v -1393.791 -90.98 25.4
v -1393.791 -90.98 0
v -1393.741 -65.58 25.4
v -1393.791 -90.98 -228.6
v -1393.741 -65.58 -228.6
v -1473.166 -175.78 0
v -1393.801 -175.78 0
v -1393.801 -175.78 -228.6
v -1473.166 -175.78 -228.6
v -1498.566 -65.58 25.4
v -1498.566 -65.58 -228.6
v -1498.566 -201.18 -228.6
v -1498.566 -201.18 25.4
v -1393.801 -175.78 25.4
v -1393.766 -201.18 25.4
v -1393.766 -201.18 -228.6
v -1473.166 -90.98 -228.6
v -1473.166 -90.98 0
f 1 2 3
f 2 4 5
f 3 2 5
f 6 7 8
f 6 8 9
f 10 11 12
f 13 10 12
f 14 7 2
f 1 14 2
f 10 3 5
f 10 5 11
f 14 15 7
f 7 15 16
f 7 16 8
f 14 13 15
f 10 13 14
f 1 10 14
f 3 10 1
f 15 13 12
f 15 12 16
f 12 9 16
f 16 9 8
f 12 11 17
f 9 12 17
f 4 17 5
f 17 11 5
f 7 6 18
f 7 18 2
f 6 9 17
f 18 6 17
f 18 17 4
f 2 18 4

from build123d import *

# Parameters (mm, degrees)
BOSS_EXTRUDE1_DEPTH      = 25.4
BOSS_EXTRUDE1_DEPTH_BACK = 228.6
BOSS_EXTRUDE2_DEPTH      = 25.4


with BuildPart() as part:
    # Sketch2 → Boss-Extrude1 (new, two sides: drawn at the far end of the back side and taken through both)
    with BuildSketch(Plane.XY.offset(-BOSS_EXTRUDE1_DEPTH_BACK)):
        Polygon((-1498.565662295, -201.179604763), (-1393.765822295, -201.179604763), (-1393.800822295, -175.779604763), (-1473.165662295, -175.779604763), (-1473.165662295, -90.979604763), (-1393.790662295, -90.979604763), (-1393.740982295, -65.579604763), (-1498.565662295, -65.579604763), align=None)
    extrude(amount=BOSS_EXTRUDE1_DEPTH + BOSS_EXTRUDE1_DEPTH_BACK)

    # Sketch2<3> → Boss-Extrude2 (add)
    with BuildSketch(Plane.XY):
        Polygon((-1473.165662295, -175.779604763), (-1393.800822295, -175.779604763), (-1393.790662295, -90.979604763), (-1473.165662295, -90.979604763), align=None)
    extrude(amount=BOSS_EXTRUDE2_DEPTH)


solid = part.part
